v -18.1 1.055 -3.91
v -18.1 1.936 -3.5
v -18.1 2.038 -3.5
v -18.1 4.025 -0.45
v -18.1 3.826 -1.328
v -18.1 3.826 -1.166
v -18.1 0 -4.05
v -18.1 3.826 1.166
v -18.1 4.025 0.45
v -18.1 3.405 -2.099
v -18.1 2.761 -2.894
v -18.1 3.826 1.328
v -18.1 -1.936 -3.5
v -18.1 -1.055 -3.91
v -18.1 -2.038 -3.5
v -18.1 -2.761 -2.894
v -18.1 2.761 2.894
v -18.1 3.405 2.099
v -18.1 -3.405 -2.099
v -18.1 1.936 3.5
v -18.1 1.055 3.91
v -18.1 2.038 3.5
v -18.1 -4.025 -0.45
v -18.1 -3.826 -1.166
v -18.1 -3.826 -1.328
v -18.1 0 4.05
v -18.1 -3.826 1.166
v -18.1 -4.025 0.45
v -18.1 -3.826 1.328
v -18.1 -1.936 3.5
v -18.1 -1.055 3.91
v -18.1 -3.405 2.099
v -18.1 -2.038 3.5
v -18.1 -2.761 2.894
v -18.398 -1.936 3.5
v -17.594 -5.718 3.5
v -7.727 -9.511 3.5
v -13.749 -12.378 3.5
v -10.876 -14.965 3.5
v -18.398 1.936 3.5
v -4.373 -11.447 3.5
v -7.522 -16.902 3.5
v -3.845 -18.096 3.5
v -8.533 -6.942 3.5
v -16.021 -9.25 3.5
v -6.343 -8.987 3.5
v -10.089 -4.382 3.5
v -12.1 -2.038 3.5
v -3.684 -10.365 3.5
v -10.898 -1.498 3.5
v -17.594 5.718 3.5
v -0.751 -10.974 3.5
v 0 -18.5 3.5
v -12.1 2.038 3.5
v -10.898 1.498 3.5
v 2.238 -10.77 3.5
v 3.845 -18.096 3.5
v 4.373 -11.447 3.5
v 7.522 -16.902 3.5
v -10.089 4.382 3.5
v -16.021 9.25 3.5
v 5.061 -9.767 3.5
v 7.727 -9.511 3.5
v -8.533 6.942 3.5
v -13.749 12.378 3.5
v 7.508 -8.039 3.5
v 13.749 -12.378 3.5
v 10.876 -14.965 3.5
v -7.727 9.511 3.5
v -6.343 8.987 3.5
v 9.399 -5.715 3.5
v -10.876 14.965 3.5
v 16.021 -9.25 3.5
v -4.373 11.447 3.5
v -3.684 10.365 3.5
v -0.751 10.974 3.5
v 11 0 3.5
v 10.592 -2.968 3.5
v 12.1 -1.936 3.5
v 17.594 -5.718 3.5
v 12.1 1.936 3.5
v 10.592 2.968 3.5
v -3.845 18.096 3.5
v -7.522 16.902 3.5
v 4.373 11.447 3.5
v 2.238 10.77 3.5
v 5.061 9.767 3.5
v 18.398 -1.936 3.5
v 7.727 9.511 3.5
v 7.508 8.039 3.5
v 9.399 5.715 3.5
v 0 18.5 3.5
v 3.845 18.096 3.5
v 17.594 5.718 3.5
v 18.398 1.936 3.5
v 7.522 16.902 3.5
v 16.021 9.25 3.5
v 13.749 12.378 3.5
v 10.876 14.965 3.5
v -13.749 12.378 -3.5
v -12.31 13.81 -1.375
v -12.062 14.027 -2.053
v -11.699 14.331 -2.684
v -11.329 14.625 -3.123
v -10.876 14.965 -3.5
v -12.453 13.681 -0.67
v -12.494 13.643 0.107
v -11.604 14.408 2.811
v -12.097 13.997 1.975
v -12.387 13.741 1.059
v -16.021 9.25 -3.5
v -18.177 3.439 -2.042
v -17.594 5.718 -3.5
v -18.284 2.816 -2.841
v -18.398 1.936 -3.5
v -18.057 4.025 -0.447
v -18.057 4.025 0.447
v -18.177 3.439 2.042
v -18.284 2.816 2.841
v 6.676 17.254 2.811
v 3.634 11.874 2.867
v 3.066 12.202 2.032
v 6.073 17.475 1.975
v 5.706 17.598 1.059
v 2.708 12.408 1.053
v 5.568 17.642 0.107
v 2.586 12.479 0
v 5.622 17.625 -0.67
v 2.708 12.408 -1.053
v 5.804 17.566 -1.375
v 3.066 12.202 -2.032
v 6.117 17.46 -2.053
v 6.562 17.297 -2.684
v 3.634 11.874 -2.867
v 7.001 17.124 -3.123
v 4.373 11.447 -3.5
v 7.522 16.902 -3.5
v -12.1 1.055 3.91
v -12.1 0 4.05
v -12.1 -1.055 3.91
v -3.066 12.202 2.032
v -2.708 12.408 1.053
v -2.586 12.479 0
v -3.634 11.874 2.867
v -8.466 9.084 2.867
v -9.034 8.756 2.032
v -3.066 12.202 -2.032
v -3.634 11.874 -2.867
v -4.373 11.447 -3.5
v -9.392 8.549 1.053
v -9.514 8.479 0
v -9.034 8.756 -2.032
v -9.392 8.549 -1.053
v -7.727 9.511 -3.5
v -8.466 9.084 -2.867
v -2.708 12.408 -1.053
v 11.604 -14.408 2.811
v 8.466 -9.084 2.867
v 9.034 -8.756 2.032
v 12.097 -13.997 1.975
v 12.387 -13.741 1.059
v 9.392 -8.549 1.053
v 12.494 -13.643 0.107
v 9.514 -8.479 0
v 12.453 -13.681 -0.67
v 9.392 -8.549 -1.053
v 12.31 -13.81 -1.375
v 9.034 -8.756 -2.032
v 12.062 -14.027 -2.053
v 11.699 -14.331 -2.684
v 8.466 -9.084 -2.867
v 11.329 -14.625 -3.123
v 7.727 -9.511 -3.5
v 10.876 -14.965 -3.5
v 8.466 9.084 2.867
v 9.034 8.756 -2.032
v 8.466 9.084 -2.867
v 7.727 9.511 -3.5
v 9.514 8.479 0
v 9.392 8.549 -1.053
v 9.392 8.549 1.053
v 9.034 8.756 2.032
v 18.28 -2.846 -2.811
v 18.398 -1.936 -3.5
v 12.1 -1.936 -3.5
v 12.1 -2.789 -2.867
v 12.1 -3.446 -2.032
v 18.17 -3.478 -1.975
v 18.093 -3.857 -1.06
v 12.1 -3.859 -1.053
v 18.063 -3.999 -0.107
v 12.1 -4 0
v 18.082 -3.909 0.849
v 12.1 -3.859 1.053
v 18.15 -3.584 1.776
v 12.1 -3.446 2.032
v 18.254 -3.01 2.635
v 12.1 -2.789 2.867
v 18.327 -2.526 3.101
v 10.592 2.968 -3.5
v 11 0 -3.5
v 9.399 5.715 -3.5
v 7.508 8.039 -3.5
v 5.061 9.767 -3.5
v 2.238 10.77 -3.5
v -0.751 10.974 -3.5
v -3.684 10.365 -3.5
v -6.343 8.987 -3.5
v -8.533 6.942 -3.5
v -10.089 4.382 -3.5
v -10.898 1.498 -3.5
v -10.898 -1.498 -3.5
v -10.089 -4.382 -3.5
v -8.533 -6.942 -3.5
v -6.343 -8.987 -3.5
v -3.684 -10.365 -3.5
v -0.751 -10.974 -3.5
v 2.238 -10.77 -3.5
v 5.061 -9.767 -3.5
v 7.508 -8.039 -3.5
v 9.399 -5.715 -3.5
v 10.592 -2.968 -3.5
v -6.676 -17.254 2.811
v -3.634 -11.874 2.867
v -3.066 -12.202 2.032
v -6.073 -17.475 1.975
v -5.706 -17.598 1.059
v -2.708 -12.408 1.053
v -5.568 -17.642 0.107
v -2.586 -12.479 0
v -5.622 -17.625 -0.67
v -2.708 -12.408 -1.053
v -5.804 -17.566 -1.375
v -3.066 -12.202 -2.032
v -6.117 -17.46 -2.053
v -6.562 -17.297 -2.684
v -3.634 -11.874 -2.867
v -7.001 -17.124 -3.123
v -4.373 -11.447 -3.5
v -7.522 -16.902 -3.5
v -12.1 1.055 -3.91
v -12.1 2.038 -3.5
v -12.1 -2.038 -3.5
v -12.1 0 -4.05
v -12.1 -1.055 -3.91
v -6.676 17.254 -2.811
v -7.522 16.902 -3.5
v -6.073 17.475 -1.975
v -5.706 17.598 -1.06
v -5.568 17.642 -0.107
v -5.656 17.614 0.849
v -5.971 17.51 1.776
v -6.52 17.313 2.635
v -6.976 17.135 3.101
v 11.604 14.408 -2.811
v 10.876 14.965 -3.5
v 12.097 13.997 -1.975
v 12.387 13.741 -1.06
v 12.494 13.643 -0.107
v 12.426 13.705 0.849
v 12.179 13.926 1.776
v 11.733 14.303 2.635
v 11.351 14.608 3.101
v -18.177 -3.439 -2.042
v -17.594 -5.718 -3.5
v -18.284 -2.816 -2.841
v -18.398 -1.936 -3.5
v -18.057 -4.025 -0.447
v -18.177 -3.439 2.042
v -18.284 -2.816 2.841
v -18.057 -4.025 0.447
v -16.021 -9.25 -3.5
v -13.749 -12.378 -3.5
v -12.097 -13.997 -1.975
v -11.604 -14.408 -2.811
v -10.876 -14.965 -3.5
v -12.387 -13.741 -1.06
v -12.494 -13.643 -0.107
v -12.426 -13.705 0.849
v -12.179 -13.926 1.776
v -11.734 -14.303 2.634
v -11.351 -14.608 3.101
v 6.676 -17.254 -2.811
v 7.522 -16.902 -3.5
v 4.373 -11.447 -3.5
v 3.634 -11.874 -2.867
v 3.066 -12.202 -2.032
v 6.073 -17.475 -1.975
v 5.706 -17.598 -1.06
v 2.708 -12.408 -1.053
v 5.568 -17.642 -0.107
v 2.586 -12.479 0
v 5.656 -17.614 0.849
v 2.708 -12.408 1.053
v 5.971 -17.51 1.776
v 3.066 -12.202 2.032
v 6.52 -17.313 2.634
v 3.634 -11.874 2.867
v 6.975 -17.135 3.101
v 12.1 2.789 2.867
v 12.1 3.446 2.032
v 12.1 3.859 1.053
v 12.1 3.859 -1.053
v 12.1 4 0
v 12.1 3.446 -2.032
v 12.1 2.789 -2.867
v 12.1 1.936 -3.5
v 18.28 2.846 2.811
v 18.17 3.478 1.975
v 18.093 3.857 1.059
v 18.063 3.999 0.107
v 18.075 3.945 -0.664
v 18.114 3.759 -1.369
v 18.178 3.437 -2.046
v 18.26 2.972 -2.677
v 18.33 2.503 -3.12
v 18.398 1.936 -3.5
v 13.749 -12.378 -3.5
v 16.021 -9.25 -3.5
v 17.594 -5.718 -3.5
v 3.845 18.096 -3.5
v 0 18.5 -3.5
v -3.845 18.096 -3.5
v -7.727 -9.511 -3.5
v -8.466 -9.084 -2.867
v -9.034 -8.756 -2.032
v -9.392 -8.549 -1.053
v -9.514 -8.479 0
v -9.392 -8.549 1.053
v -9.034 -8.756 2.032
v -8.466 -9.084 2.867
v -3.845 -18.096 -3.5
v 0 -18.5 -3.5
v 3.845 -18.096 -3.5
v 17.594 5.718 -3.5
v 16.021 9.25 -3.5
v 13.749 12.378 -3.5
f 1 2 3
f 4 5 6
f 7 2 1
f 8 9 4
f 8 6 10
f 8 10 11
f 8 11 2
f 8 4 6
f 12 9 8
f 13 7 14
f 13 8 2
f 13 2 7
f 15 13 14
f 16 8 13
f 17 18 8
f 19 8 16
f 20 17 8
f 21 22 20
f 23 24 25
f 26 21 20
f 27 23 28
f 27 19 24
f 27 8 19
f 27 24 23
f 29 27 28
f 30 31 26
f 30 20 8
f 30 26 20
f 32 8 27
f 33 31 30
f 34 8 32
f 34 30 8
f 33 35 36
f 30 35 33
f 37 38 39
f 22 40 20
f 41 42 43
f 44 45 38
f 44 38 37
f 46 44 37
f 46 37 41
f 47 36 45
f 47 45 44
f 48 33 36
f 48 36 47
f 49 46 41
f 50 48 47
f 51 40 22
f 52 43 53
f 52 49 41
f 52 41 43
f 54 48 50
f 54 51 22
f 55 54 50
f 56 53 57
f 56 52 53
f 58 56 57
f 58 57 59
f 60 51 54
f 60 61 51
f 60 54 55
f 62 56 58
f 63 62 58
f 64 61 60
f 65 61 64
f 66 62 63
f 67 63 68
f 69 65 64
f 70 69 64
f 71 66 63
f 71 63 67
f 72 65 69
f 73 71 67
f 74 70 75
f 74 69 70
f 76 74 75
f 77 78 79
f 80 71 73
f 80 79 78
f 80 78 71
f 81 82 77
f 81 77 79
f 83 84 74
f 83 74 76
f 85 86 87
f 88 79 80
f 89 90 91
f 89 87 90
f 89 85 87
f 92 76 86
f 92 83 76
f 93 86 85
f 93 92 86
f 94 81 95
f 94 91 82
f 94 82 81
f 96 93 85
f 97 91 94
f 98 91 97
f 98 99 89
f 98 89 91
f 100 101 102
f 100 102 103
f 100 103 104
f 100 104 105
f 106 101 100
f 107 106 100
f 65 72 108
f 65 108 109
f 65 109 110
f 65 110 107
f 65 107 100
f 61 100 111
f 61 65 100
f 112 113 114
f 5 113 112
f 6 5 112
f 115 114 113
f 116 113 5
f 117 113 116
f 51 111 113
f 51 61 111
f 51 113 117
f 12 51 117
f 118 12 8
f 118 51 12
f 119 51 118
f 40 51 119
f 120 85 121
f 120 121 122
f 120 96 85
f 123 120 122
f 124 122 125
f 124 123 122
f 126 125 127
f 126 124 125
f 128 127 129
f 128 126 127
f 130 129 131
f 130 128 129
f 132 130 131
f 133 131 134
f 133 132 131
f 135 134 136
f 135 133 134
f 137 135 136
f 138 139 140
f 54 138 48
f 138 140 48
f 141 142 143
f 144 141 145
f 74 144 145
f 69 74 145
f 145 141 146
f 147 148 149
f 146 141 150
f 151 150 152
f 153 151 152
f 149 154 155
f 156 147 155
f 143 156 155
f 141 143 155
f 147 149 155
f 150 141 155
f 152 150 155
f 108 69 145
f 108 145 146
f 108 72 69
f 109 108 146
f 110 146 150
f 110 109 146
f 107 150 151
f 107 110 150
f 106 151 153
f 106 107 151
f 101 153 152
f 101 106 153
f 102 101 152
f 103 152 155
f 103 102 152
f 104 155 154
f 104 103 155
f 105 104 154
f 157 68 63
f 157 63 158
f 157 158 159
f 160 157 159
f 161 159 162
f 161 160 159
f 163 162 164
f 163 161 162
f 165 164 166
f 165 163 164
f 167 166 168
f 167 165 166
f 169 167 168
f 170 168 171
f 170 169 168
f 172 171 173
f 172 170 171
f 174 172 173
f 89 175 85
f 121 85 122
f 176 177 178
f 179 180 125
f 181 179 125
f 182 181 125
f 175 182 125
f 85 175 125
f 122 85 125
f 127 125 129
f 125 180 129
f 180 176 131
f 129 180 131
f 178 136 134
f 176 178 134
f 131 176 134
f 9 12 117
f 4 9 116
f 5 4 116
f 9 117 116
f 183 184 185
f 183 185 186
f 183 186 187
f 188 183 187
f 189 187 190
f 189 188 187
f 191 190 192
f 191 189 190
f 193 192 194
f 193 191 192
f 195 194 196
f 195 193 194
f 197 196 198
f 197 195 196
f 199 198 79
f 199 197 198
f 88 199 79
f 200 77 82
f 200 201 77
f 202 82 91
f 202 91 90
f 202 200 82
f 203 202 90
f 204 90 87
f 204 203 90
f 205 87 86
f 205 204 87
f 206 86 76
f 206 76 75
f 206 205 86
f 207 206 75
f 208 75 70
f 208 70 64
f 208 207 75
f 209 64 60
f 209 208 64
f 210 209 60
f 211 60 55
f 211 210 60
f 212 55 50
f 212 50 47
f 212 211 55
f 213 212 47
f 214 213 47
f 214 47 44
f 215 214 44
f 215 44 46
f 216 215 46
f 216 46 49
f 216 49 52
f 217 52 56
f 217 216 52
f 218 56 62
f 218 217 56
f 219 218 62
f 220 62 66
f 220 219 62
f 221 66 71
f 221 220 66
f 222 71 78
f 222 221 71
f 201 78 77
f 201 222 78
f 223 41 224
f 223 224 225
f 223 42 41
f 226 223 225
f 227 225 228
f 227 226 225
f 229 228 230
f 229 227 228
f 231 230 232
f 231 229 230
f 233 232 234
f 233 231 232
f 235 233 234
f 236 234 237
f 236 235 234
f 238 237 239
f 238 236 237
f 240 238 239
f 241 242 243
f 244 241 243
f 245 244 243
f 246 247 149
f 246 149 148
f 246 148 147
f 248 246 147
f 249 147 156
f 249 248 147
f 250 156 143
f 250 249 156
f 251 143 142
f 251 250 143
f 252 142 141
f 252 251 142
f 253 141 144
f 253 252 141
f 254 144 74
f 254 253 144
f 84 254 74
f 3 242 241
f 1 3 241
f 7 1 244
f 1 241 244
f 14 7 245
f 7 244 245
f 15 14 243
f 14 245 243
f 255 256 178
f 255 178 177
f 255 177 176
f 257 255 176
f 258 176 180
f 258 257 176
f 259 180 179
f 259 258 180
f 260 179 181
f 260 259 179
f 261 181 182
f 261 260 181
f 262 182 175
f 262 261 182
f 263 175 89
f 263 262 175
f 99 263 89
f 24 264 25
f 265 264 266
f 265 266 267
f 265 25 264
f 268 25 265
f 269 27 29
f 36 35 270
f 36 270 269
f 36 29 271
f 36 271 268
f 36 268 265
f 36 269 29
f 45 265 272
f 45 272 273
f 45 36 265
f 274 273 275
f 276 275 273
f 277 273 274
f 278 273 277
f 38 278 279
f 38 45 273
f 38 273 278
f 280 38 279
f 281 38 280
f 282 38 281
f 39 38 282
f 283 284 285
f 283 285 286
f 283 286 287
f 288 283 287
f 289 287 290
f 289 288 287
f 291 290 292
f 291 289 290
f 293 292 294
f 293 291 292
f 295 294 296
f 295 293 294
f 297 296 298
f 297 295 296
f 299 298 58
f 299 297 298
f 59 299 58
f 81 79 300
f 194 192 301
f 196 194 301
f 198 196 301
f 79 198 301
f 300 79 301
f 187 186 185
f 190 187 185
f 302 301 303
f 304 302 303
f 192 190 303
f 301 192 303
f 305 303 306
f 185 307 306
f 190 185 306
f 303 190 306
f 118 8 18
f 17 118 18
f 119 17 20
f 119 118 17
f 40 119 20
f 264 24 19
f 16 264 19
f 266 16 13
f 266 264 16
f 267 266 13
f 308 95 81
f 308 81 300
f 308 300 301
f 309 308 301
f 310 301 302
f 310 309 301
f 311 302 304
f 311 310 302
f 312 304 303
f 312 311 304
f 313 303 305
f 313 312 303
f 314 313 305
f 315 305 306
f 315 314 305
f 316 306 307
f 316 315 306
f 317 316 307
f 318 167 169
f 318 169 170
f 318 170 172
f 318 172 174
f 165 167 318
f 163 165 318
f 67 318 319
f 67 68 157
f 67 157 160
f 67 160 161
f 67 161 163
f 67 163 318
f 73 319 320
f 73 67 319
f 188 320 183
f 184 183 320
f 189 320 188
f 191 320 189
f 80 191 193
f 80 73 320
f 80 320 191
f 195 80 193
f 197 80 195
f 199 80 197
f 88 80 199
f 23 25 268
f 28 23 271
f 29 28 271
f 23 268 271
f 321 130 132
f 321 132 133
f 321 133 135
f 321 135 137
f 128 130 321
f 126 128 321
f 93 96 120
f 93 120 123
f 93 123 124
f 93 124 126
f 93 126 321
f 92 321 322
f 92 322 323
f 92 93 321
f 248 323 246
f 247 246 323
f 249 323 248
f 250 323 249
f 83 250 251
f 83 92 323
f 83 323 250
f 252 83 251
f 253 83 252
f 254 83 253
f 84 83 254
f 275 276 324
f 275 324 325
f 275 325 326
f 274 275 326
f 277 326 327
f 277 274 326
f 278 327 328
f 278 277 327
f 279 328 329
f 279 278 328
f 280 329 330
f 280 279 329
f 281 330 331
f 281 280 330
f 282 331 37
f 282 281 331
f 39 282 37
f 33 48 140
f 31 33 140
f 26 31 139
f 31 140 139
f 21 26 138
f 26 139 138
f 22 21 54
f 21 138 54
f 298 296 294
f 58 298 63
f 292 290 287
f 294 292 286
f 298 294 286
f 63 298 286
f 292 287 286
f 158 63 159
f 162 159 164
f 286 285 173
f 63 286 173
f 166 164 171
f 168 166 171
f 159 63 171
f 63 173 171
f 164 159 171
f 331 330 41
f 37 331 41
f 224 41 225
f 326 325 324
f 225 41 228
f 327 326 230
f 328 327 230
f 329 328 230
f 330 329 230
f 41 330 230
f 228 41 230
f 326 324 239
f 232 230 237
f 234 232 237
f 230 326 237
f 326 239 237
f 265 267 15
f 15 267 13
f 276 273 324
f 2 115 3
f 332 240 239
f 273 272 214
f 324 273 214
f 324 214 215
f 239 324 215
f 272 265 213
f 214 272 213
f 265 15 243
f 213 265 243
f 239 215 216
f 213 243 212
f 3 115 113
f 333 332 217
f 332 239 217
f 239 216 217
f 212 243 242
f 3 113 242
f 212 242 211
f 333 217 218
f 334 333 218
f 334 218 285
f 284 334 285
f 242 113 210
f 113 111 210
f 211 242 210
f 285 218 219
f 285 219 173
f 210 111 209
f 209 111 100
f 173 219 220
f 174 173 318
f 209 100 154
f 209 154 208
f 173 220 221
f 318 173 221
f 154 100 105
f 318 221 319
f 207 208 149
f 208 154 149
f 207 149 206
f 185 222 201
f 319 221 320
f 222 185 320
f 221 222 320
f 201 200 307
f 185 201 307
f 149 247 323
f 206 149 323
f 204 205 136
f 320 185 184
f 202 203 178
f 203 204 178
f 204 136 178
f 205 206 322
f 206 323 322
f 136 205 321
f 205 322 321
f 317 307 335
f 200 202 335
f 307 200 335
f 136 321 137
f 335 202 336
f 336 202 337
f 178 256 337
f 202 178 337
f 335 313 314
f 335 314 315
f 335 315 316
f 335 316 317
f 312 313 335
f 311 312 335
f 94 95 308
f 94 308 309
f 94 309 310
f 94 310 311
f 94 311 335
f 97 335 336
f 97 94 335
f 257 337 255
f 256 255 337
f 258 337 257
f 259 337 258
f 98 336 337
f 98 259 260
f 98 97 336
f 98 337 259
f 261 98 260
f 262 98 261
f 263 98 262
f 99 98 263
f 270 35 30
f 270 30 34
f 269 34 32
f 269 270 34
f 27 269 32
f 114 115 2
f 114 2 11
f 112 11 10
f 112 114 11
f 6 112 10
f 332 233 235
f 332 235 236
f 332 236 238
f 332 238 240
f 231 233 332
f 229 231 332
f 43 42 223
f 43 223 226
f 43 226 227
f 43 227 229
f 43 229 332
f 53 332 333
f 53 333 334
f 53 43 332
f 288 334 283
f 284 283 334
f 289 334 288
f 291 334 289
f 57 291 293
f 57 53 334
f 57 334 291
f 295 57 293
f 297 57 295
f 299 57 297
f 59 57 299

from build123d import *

# Parameters (mm, degrees)
SKETCH1_R           = 18.5
SKETCH1_R_2         = 11
BOSS_EXTRUDE1_DEPTH = 3.5
SKETCH2_R           = 4
CUT_EXTRUDE3_DEPTH  = 6.4
CIRPATTERN1_COUNT   = 6
SKETCH3_R           = 4.05
BOSS_EXTRUDE2_DEPTH = 6


with BuildPart() as part:
    # Sketch1 → Boss-Extrude1 (new, symmetric)
    with BuildSketch(Plane.XY):
        Circle(SKETCH1_R)
        Circle(SKETCH1_R_2, mode=Mode.SUBTRACT)
    extrude(amount=BOSS_EXTRUDE1_DEPTH, both=True)

    # Sketch2 → Cut-Extrude3 (cut)
    with BuildSketch(Plane(origin=(-18.5, -17.193061184, 0), x_dir=(0, -1, 0), z_dir=(1, 0, 0))):
        with Locations((-17.193061184, 0)):
            Circle(SKETCH2_R)
    cut_extrude3 = extrude(amount=CUT_EXTRUDE3_DEPTH, mode=Mode.SUBTRACT)

    # CirPattern1: Cut-Extrude3 ×6 about axis
    cirpattern1_axis = Axis((0, 0, 3.5), (0, 0, 1))
    for i in range(1, CIRPATTERN1_COUNT):
        add(cut_extrude3.rotate(cirpattern1_axis, i * 360 / CIRPATTERN1_COUNT), mode=Mode.SUBTRACT)

    # Sketch3 → Boss-Extrude2 (add)
    with BuildSketch(Plane(origin=(-12.1, 0, 0), x_dir=(0, -1, 0), z_dir=(-1, 0, 0))):
        Circle(SKETCH3_R)
    extrude(amount=BOSS_EXTRUDE2_DEPTH)


solid = part.part
